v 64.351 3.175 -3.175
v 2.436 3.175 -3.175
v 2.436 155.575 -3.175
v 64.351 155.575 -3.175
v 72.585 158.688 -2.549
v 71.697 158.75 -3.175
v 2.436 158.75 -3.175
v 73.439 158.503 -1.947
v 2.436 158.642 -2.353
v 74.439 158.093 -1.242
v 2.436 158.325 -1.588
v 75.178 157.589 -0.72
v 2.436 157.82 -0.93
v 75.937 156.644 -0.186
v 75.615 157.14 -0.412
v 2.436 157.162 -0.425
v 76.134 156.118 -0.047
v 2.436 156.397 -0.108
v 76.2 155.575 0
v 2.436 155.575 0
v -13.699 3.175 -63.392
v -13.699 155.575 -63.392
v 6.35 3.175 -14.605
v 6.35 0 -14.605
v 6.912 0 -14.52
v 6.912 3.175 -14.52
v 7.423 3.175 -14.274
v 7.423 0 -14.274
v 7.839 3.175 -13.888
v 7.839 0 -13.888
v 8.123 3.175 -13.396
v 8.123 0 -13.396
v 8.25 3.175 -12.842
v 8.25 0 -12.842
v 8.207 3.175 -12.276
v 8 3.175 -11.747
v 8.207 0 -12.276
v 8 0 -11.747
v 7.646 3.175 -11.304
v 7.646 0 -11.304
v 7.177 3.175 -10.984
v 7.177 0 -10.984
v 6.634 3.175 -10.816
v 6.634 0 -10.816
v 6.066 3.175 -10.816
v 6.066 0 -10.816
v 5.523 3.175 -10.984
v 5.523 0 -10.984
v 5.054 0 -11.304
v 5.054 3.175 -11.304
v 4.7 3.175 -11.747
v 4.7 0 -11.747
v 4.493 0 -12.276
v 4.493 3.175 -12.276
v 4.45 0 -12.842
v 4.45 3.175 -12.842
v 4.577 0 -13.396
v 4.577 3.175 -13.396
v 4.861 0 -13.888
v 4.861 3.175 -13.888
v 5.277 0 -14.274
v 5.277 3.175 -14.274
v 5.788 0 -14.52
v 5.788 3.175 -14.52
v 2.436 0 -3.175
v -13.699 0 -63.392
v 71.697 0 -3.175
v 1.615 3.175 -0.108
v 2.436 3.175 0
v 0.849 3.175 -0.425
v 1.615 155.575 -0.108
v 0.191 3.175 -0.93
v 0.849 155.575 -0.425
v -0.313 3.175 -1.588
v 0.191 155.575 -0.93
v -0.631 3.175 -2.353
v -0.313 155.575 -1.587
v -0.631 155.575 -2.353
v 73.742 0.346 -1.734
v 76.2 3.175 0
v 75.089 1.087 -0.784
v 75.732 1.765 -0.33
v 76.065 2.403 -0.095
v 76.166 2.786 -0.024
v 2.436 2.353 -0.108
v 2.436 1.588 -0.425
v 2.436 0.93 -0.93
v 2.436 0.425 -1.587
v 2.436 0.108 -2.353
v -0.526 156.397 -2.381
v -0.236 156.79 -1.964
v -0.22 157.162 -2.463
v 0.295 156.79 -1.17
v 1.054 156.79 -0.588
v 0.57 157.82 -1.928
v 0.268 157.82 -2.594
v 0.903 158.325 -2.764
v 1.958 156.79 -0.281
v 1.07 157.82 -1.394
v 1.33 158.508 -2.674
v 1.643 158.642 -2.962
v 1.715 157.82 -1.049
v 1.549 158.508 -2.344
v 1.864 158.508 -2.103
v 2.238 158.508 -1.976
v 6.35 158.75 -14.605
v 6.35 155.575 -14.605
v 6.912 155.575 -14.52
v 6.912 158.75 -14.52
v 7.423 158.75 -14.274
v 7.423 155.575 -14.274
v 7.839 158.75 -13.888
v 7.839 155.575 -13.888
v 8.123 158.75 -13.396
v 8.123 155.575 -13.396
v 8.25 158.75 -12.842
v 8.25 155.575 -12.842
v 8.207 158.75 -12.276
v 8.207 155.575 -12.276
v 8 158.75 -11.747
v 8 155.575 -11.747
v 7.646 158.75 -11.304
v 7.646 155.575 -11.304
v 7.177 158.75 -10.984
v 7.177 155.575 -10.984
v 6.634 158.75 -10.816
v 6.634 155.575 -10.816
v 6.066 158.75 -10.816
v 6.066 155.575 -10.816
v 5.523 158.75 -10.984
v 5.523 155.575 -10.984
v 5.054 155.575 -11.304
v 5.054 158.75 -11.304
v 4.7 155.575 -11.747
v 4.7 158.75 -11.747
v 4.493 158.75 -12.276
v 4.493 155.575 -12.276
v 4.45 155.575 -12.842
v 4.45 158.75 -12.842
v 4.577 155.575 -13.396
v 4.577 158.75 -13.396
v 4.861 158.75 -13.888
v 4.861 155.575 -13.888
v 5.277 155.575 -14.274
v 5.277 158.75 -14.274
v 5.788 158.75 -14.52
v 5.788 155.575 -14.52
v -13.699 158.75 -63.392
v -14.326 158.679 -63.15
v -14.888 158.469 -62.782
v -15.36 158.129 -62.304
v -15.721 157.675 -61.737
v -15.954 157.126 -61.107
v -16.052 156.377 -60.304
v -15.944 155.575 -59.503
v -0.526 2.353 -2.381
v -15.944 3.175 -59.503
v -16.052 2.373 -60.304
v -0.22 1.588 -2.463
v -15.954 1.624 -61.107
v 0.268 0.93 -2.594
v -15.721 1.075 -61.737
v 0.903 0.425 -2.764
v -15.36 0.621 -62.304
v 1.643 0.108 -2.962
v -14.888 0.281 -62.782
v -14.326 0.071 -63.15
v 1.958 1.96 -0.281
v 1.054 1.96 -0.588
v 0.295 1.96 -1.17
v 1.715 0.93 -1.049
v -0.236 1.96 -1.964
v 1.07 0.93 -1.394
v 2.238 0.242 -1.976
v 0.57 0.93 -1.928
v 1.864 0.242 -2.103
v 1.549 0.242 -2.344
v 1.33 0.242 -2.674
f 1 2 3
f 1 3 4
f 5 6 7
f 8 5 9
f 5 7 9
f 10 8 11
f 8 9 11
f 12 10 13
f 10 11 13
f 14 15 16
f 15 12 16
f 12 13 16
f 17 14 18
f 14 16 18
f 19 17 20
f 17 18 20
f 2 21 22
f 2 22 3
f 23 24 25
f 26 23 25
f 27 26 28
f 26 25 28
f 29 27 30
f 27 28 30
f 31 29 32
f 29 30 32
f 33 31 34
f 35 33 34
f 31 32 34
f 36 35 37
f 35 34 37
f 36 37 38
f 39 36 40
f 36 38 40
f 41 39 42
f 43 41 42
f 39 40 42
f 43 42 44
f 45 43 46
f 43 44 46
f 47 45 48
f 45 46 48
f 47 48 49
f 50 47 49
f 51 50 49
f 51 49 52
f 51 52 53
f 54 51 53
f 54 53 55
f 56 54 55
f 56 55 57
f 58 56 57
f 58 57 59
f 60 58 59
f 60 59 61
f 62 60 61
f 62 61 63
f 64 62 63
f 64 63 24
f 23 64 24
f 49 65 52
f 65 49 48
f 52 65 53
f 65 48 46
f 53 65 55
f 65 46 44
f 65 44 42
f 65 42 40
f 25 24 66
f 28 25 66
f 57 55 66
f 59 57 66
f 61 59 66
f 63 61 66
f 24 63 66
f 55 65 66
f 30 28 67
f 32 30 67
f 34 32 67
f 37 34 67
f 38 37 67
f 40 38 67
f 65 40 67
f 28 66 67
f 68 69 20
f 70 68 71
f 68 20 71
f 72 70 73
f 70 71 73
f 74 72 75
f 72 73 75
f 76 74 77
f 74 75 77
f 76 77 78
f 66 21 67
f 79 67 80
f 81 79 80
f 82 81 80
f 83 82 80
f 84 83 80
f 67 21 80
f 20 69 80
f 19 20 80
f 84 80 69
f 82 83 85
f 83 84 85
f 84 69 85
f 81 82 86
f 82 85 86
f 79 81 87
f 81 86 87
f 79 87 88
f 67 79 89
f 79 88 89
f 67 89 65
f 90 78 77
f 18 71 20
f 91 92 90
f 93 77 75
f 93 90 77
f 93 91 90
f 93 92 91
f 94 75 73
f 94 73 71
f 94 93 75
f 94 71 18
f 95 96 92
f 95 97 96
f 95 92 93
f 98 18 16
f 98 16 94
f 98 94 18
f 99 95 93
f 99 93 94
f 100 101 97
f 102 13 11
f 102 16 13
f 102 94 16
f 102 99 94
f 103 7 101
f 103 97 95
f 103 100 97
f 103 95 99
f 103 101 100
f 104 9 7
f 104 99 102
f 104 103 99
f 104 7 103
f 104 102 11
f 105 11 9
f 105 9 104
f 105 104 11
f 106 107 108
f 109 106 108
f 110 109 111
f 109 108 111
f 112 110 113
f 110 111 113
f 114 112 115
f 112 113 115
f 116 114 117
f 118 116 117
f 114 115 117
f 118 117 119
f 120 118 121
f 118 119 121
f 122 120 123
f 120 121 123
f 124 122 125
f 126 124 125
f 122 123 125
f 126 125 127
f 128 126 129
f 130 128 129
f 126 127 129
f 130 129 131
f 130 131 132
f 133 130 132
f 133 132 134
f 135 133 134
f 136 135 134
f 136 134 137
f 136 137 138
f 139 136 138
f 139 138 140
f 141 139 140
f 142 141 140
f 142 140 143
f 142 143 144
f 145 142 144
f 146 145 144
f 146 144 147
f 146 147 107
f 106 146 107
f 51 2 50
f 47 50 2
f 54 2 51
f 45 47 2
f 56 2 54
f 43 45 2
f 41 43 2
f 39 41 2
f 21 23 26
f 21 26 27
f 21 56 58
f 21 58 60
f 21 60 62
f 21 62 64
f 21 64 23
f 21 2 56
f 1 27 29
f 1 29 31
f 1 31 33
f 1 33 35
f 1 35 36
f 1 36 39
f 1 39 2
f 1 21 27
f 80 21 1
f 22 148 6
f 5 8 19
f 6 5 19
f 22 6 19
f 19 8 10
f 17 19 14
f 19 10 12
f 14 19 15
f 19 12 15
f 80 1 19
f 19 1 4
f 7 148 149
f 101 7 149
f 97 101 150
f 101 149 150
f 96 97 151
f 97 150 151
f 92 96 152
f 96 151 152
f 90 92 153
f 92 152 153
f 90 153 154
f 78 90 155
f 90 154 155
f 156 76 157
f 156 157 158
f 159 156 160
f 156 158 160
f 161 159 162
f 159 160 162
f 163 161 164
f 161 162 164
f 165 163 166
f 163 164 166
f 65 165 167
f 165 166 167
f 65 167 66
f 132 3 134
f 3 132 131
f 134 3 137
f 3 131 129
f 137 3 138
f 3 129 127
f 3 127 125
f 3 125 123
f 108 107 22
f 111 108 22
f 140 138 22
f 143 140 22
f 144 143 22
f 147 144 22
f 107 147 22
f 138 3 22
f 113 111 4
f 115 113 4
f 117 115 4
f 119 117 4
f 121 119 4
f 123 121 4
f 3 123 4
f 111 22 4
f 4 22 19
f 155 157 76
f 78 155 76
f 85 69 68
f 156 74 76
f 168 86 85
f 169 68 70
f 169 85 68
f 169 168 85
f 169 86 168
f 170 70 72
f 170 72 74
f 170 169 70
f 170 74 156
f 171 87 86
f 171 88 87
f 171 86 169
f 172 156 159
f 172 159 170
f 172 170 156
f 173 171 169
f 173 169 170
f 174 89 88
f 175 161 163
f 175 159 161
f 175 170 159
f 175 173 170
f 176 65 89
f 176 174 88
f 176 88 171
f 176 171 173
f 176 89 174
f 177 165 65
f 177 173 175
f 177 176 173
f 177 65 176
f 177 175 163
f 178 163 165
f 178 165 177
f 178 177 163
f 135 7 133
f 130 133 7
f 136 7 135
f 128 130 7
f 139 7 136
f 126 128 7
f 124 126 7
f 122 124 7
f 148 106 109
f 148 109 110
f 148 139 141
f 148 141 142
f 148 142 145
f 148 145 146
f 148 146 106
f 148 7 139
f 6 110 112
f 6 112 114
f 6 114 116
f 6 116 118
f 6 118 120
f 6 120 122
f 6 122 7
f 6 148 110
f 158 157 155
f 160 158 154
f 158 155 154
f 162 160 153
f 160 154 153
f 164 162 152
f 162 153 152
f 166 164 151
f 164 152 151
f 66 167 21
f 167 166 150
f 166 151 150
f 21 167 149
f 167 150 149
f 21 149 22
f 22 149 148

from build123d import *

# Parameters (mm, degrees)
BOSS_EXTRUDE1_DEPTH = 3.175
BOSS_EXTRUDE3_DEPTH = 152.4
BOSS_EXTRUDE4_DEPTH = 3.175
FILLET1_R           = 3.175
CHAMFER1_SIZE2      = 11.849261314
CHAMFER1_SIZE       = 3.175
SKETCH4_R           = 1.905
CUT_EXTRUDE1_DEPTH  = 158.75
CUT_EXTRUDE2_DEPTH  = 254


# Some blends are built 0.0001 mm under size
with BuildPart() as part:
    # Sketch1 → Boss-Extrude1 (new body)
    with BuildSketch(Plane(origin=(0, 0, 0), x_dir=(1, 0, 0), z_dir=(0, 1, 0))):
        Polygon((0, 0), (76.2, 0), (76.2, 63.5), (-17.014773719, 63.5), align=None)
    extrude(amount=BOSS_EXTRUDE1_DEPTH)

    # Sketch2 → Boss-Extrude3 (add)
    with BuildSketch(Plane(origin=(0, 3.175, 0), x_dir=(1, 0, 0), z_dir=(0, 1, 0))):
        Polygon((76.2, 0), (0, 0), (-17.014773719, 63.5), (-13.727771847, 63.5), (2.436263187, 3.175), (76.2, 3.175), align=None)
    extrude(amount=BOSS_EXTRUDE3_DEPTH)

    # Sketch3 → Boss-Extrude4 (add)
    with BuildSketch(Plane(origin=(0, 155.575, 0), x_dir=(1, 0, 0), z_dir=(0, 1, 0))):
        Polygon((-17.014773719, 63.5), (0, 0), (76.2, 0), (76.2, 63.5), align=None)
    extrude(amount=BOSS_EXTRUDE4_DEPTH)

    # Fillet1
    # the kernel refuses this fillet: 3.175 mm, written as the material it takes off along each edge
    with BuildSketch(Plane(origin=(2.436263187, 3.175, -3.175), x_dir=(-0.9659258262890689, 0, 0.2588190451025188), z_dir=(0, -1, 0))) as fillet1_piece_1_section:
        Polygon((0, 0), (FILLET1_R * 1.02, 0), (FILLET1_R * 1.02, -FILLET1_R * 0.782673527739), (FILLET1_R * 0.263995426005, -FILLET1_R * 0.985244342815), align=None)
    fillet1_piece_1 = extrude(amount=FILLET1_R * 1.02, mode=Mode.PRIVATE)
    fillet1_piece_1 = fillet1_piece_1 - Plane(origin=(2.436263187, 3.175, -3.175), x_dir=(0.6087614290087213, 0, -0.7933533402912346), z_dir=(0, -1, 0)) * Sphere(FILLET1_R, mode=Mode.PRIVATE)
    add(fillet1_piece_1, mode=Mode.SUBTRACT)
    with BuildSketch(Plane(origin=(2.436263187, 155.575, -3.175), x_dir=(0, 0, 1), z_dir=(0, 1, 0))) as fillet1_piece_2_section:
        Polygon((0, 0), (FILLET1_R * 1.02, 0), (FILLET1_R * 1.02, -FILLET1_R * 0.782673527739), (FILLET1_R * 0.263995426005, -FILLET1_R * 0.985244342815), align=None)
    fillet1_piece_2 = extrude(amount=FILLET1_R * 1.02, mode=Mode.PRIVATE)
    fillet1_piece_2 = fillet1_piece_2 - Plane(origin=(2.436263187, 155.575, -3.175), x_dir=(0.6087614290087213, 0, -0.7933533402912346), z_dir=(0, 1, 0)) * Sphere(FILLET1_R, mode=Mode.PRIVATE)
    add(fillet1_piece_2, mode=Mode.SUBTRACT)
    with BuildSketch(Plane(origin=(-17.014773719, 158.75, -63.5), x_dir=(1, 0, 0), z_dir=(0, -1, 0))) as fillet1_piece_3:
        with BuildLine():
            CenterArc((FILLET1_R * 1.30322537284, FILLET1_R), FILLET1_R, 165, 105)
            Line((FILLET1_R * 0.337299546552, FILLET1_R * 1.2588190451), (FILLET1_R * 0.317981030026, FILLET1_R * 1.263995426))
            Line((FILLET1_R * 0.317981030026, FILLET1_R * 1.263995426), (-FILLET1_R * 0.0260645074568, -FILLET1_R * 0.02))
            Line((-FILLET1_R * 0.0260645074568, -FILLET1_R * 0.02), (FILLET1_R * 1.30322537284, -FILLET1_R * 0.02))
            Line((FILLET1_R * 1.30322537284, -FILLET1_R * 0.02), (FILLET1_R * 1.30322537284, 0))
        make_face()
    extrude(amount=158.75, mode=Mode.SUBTRACT)
    with BuildSketch(Plane(origin=(2.436263187, 0, 0), x_dir=(0, 1, 0), z_dir=(1, 0, 0))) as fillet1_piece_4:
        with BuildLine():
            CenterArc((FILLET1_R, -FILLET1_R), FILLET1_R, 90, 90)
            Line((0, -FILLET1_R), (-FILLET1_R * 0.02, -FILLET1_R))
            Line((-FILLET1_R * 0.02, -FILLET1_R), (-FILLET1_R * 0.02, FILLET1_R * 0.02))
            Line((-FILLET1_R * 0.02, FILLET1_R * 0.02), (FILLET1_R, FILLET1_R * 0.02))
            Line((FILLET1_R, FILLET1_R * 0.02), (FILLET1_R, 0))
        make_face()
    extrude(amount=73.763736813, mode=Mode.SUBTRACT)
    with BuildSketch(Plane(origin=(-19.06914989, 0, -71.167036246), x_dir=(0.9659258262890688, 0, -0.25881904510251874), z_dir=(0.2588190451025188, 0, 0.9659258262890689))) as fillet1_piece_5_section:
        with BuildLine():
            CenterArc((FILLET1_R, FILLET1_R), FILLET1_R, 180, 90)
            Line((0, FILLET1_R), (-FILLET1_R * 0.02, FILLET1_R))
            Line((-FILLET1_R * 0.02, FILLET1_R), (-FILLET1_R * 0.02, -FILLET1_R * 0.02))
            Line((-FILLET1_R * 0.02, -FILLET1_R * 0.02), (FILLET1_R, -FILLET1_R * 0.02))
            Line((FILLET1_R, -FILLET1_R * 0.02), (FILLET1_R, 0))
        make_face()
    fillet1_piece_5 = extrude(amount=71.241274269, mode=Mode.PRIVATE)
    fillet1_piece_5 = split(fillet1_piece_5, bisect_by=Plane(origin=(-8.105416373, 0.719979608, -63.5), z_dir=(0, 0, 1)), keep=Keep.TOP, mode=Mode.PRIVATE)
    add(fillet1_piece_5, mode=Mode.SUBTRACT)
    with BuildSketch(Plane(origin=(0, 155.575, 0), x_dir=(1, 0, 0), z_dir=(0, -1, 0))) as fillet1_piece_6:
        with BuildLine():
            CenterArc((FILLET1_R * 0.767326987979, -FILLET1_R), FILLET1_R, 90, 75)
            Line((-FILLET1_R * 0.19859883831, -FILLET1_R * 0.741180954897), (-FILLET1_R * 0.217917354836, -FILLET1_R * 0.736004573995))
            Line((-FILLET1_R * 0.217917354836, -FILLET1_R * 0.736004573995), (-FILLET1_R * 0.0153465397596, FILLET1_R * 0.02))
            Line((-FILLET1_R * 0.0153465397596, FILLET1_R * 0.02), (FILLET1_R * 0.767326987979, FILLET1_R * 0.02))
            Line((FILLET1_R * 0.767326987979, FILLET1_R * 0.02), (FILLET1_R * 0.767326987979, 0))
        make_face()
    extrude(amount=152.4, mode=Mode.SUBTRACT)
    with BuildSketch(Plane(origin=(2.436263187, 158.75, 0), x_dir=(0, -1, 0), z_dir=(1, 0, 0))) as fillet1_piece_7:
        with BuildLine():
            CenterArc((FILLET1_R, FILLET1_R), FILLET1_R, 180, 90)
            Line((0, FILLET1_R), (-FILLET1_R * 0.02, FILLET1_R))
            Line((-FILLET1_R * 0.02, FILLET1_R), (-FILLET1_R * 0.02, -FILLET1_R * 0.02))
            Line((-FILLET1_R * 0.02, -FILLET1_R * 0.02), (FILLET1_R, -FILLET1_R * 0.02))
            Line((FILLET1_R, -FILLET1_R * 0.02), (FILLET1_R, 0))
        make_face()
    extrude(amount=73.763736813, mode=Mode.SUBTRACT)
    with BuildSketch(Plane(origin=(-19.06914989, 158.75, -71.167036246), x_dir=(0.9659258262890688, 0, -0.25881904510251874), z_dir=(0.2588190451025188, 0, 0.9659258262890689))) as fillet1_piece_8_section:
        with BuildLine():
            CenterArc((FILLET1_R, -FILLET1_R), FILLET1_R, 90, 90)
            Line((0, -FILLET1_R), (-FILLET1_R * 0.02, -FILLET1_R))
            Line((-FILLET1_R * 0.02, -FILLET1_R), (-FILLET1_R * 0.02, FILLET1_R * 0.02))
            Line((-FILLET1_R * 0.02, FILLET1_R * 0.02), (FILLET1_R, FILLET1_R * 0.02))
            Line((FILLET1_R, FILLET1_R * 0.02), (FILLET1_R, 0))
        make_face()
    fillet1_piece_8 = extrude(amount=71.241274269, mode=Mode.PRIVATE)
    fillet1_piece_8 = split(fillet1_piece_8, bisect_by=Plane(origin=(-8.105416373, 158.030020392, -63.5), z_dir=(0, 0, 1)), keep=Keep.TOP, mode=Mode.PRIVATE)
    add(fillet1_piece_8, mode=Mode.SUBTRACT)
    with BuildSketch(Plane(origin=(-17.014773719, 169.094351397, -63.5), x_dir=(1, 0, 0), z_dir=(0, -1, 0))) as fillet1_piece_9a_section:
        with BuildLine():
            CenterArc((FILLET1_R * 1.30322537284, FILLET1_R), FILLET1_R, 165, 105)
            Line((FILLET1_R * 0.337299546552, FILLET1_R * 1.2588190451), (FILLET1_R * 0.317981030026, FILLET1_R * 1.263995426))
            Line((FILLET1_R * 0.317981030026, FILLET1_R * 1.263995426), (-FILLET1_R * 0.0260645074568, -FILLET1_R * 0.02))
            Line((-FILLET1_R * 0.0260645074568, -FILLET1_R * 0.02), (FILLET1_R * 1.30322537284, -FILLET1_R * 0.02))
            Line((FILLET1_R * 1.30322537284, -FILLET1_R * 0.02), (FILLET1_R * 1.30322537284, 0))
        make_face()
    fillet1_piece_9a = extrude(amount=169.094351397, mode=Mode.PRIVATE)
    fillet1_piece_9a = split(fillet1_piece_9a, bisect_by=Plane(origin=(-15.793777483, 158.75, -62.563096636), z_dir=(0, 1, 0)), keep=Keep.TOP, mode=Mode.PRIVATE)
    with BuildSketch(Plane(origin=(-19.06914989, 158.75, -71.167036246), x_dir=(0.9659258262890688, 0, -0.25881904510251874), z_dir=(0.2588190451025188, 0, 0.9659258262890689))) as fillet1_piece_9b_section:
        with BuildLine():
            CenterArc((FILLET1_R, -FILLET1_R), FILLET1_R, 90, 90)
            Line((0, -FILLET1_R), (-FILLET1_R * 0.02, -FILLET1_R))
            Line((-FILLET1_R * 0.02, -FILLET1_R), (-FILLET1_R * 0.02, FILLET1_R * 0.02))
            Line((-FILLET1_R * 0.02, FILLET1_R * 0.02), (FILLET1_R, FILLET1_R * 0.02))
            Line((FILLET1_R, FILLET1_R * 0.02), (FILLET1_R, 0))
        make_face()
    fillet1_piece_9b = extrude(amount=71.241274269, mode=Mode.PRIVATE)
    fillet1_piece_9b = split(fillet1_piece_9b, bisect_by=Plane(origin=(-17.307274922, 158.04031756, -63.5), z_dir=(0, 0, -1)), keep=Keep.TOP, mode=Mode.PRIVATE)
    fillet1_piece_9 = fillet1_piece_9a & fillet1_piece_9b
    add(fillet1_piece_9, mode=Mode.SUBTRACT)
    with BuildSketch(Plane(origin=(-19.06914989, 0, -71.167036246), x_dir=(0.9659258262890688, 0, -0.25881904510251874), z_dir=(0.2588190451025188, 0, 0.9659258262890689))) as fillet1_piece_10a_section:
        with BuildLine():
            CenterArc((FILLET1_R, FILLET1_R), FILLET1_R, 180, 90)
            Line((0, FILLET1_R), (-FILLET1_R * 0.02, FILLET1_R))
            Line((-FILLET1_R * 0.02, FILLET1_R), (-FILLET1_R * 0.02, -FILLET1_R * 0.02))
            Line((-FILLET1_R * 0.02, -FILLET1_R * 0.02), (FILLET1_R, -FILLET1_R * 0.02))
            Line((FILLET1_R, -FILLET1_R * 0.02), (FILLET1_R, 0))
        make_face()
    fillet1_piece_10a = extrude(amount=71.241274269, mode=Mode.PRIVATE)
    fillet1_piece_10a = split(fillet1_piece_10a, bisect_by=Plane(origin=(-17.307274922, 0.70968244, -63.5), z_dir=(0, 0, -1)), keep=Keep.TOP, mode=Mode.PRIVATE)
    with BuildSketch(Plane(origin=(-17.014773719, 158.75, -63.5), x_dir=(1, 0, 0), z_dir=(0, -1, 0))) as fillet1_piece_10b_section:
        with BuildLine():
            CenterArc((FILLET1_R * 1.30322537284, FILLET1_R), FILLET1_R, 165, 105)
            Line((FILLET1_R * 0.337299546552, FILLET1_R * 1.2588190451), (FILLET1_R * 0.317981030026, FILLET1_R * 1.263995426))
            Line((FILLET1_R * 0.317981030026, FILLET1_R * 1.263995426), (-FILLET1_R * 0.0260645074568, -FILLET1_R * 0.02))
            Line((-FILLET1_R * 0.0260645074568, -FILLET1_R * 0.02), (FILLET1_R * 1.30322537284, -FILLET1_R * 0.02))
            Line((FILLET1_R * 1.30322537284, -FILLET1_R * 0.02), (FILLET1_R * 1.30322537284, 0))
        make_face()
    fillet1_piece_10b = extrude(amount=169.094351397, mode=Mode.PRIVATE)
    fillet1_piece_10b = split(fillet1_piece_10b, bisect_by=Plane(origin=(-15.793777483, 0, -62.563096636), z_dir=(0, -1, 0)), keep=Keep.TOP, mode=Mode.PRIVATE)
    fillet1_piece_10 = fillet1_piece_10a & fillet1_piece_10b
    add(fillet1_piece_10, mode=Mode.SUBTRACT)

    # Chamfer1
    chamfer1_edges = [part.edges().sort_by_distance(p)[0] for p in [
        (76.2, 79.375, -3.175),
    ]]
    chamfer1_side = [part.faces().sort_by_distance(p)[0] for p in [
        (76.2, 79.375, -3.1115),
    ]]
    chamfer(chamfer1_edges, length=CHAMFER1_SIZE - 0.0001, length2=CHAMFER1_SIZE2 - 0.0001, reference=chamfer1_side[0])  # a hair under: the kernel refuses the full size

    # Sketch4 → Cut-Extrude1 (cut)
    with BuildSketch(Plane.XZ):
        with Locations(Location((6.35, -12.7, 0), (0, 0, 270))):
            Circle(SKETCH4_R)
    extrude(amount=-CUT_EXTRUDE1_DEPTH, mode=Mode.SUBTRACT)

    # Sketch6 → Cut-Extrude2 (cut)
    with BuildSketch(Plane(origin=(0, 158.75, 0), x_dir=(1, 0, 0), z_dir=(0, 1, 0))):
        Polygon((-13.698783629, 63.391814498), (76.2, 0), (76.2, 63.5), (-15.882639691, 64.0756894), align=None)
    extrude(amount=-CUT_EXTRUDE2_DEPTH, mode=Mode.SUBTRACT)


solid = part.part
